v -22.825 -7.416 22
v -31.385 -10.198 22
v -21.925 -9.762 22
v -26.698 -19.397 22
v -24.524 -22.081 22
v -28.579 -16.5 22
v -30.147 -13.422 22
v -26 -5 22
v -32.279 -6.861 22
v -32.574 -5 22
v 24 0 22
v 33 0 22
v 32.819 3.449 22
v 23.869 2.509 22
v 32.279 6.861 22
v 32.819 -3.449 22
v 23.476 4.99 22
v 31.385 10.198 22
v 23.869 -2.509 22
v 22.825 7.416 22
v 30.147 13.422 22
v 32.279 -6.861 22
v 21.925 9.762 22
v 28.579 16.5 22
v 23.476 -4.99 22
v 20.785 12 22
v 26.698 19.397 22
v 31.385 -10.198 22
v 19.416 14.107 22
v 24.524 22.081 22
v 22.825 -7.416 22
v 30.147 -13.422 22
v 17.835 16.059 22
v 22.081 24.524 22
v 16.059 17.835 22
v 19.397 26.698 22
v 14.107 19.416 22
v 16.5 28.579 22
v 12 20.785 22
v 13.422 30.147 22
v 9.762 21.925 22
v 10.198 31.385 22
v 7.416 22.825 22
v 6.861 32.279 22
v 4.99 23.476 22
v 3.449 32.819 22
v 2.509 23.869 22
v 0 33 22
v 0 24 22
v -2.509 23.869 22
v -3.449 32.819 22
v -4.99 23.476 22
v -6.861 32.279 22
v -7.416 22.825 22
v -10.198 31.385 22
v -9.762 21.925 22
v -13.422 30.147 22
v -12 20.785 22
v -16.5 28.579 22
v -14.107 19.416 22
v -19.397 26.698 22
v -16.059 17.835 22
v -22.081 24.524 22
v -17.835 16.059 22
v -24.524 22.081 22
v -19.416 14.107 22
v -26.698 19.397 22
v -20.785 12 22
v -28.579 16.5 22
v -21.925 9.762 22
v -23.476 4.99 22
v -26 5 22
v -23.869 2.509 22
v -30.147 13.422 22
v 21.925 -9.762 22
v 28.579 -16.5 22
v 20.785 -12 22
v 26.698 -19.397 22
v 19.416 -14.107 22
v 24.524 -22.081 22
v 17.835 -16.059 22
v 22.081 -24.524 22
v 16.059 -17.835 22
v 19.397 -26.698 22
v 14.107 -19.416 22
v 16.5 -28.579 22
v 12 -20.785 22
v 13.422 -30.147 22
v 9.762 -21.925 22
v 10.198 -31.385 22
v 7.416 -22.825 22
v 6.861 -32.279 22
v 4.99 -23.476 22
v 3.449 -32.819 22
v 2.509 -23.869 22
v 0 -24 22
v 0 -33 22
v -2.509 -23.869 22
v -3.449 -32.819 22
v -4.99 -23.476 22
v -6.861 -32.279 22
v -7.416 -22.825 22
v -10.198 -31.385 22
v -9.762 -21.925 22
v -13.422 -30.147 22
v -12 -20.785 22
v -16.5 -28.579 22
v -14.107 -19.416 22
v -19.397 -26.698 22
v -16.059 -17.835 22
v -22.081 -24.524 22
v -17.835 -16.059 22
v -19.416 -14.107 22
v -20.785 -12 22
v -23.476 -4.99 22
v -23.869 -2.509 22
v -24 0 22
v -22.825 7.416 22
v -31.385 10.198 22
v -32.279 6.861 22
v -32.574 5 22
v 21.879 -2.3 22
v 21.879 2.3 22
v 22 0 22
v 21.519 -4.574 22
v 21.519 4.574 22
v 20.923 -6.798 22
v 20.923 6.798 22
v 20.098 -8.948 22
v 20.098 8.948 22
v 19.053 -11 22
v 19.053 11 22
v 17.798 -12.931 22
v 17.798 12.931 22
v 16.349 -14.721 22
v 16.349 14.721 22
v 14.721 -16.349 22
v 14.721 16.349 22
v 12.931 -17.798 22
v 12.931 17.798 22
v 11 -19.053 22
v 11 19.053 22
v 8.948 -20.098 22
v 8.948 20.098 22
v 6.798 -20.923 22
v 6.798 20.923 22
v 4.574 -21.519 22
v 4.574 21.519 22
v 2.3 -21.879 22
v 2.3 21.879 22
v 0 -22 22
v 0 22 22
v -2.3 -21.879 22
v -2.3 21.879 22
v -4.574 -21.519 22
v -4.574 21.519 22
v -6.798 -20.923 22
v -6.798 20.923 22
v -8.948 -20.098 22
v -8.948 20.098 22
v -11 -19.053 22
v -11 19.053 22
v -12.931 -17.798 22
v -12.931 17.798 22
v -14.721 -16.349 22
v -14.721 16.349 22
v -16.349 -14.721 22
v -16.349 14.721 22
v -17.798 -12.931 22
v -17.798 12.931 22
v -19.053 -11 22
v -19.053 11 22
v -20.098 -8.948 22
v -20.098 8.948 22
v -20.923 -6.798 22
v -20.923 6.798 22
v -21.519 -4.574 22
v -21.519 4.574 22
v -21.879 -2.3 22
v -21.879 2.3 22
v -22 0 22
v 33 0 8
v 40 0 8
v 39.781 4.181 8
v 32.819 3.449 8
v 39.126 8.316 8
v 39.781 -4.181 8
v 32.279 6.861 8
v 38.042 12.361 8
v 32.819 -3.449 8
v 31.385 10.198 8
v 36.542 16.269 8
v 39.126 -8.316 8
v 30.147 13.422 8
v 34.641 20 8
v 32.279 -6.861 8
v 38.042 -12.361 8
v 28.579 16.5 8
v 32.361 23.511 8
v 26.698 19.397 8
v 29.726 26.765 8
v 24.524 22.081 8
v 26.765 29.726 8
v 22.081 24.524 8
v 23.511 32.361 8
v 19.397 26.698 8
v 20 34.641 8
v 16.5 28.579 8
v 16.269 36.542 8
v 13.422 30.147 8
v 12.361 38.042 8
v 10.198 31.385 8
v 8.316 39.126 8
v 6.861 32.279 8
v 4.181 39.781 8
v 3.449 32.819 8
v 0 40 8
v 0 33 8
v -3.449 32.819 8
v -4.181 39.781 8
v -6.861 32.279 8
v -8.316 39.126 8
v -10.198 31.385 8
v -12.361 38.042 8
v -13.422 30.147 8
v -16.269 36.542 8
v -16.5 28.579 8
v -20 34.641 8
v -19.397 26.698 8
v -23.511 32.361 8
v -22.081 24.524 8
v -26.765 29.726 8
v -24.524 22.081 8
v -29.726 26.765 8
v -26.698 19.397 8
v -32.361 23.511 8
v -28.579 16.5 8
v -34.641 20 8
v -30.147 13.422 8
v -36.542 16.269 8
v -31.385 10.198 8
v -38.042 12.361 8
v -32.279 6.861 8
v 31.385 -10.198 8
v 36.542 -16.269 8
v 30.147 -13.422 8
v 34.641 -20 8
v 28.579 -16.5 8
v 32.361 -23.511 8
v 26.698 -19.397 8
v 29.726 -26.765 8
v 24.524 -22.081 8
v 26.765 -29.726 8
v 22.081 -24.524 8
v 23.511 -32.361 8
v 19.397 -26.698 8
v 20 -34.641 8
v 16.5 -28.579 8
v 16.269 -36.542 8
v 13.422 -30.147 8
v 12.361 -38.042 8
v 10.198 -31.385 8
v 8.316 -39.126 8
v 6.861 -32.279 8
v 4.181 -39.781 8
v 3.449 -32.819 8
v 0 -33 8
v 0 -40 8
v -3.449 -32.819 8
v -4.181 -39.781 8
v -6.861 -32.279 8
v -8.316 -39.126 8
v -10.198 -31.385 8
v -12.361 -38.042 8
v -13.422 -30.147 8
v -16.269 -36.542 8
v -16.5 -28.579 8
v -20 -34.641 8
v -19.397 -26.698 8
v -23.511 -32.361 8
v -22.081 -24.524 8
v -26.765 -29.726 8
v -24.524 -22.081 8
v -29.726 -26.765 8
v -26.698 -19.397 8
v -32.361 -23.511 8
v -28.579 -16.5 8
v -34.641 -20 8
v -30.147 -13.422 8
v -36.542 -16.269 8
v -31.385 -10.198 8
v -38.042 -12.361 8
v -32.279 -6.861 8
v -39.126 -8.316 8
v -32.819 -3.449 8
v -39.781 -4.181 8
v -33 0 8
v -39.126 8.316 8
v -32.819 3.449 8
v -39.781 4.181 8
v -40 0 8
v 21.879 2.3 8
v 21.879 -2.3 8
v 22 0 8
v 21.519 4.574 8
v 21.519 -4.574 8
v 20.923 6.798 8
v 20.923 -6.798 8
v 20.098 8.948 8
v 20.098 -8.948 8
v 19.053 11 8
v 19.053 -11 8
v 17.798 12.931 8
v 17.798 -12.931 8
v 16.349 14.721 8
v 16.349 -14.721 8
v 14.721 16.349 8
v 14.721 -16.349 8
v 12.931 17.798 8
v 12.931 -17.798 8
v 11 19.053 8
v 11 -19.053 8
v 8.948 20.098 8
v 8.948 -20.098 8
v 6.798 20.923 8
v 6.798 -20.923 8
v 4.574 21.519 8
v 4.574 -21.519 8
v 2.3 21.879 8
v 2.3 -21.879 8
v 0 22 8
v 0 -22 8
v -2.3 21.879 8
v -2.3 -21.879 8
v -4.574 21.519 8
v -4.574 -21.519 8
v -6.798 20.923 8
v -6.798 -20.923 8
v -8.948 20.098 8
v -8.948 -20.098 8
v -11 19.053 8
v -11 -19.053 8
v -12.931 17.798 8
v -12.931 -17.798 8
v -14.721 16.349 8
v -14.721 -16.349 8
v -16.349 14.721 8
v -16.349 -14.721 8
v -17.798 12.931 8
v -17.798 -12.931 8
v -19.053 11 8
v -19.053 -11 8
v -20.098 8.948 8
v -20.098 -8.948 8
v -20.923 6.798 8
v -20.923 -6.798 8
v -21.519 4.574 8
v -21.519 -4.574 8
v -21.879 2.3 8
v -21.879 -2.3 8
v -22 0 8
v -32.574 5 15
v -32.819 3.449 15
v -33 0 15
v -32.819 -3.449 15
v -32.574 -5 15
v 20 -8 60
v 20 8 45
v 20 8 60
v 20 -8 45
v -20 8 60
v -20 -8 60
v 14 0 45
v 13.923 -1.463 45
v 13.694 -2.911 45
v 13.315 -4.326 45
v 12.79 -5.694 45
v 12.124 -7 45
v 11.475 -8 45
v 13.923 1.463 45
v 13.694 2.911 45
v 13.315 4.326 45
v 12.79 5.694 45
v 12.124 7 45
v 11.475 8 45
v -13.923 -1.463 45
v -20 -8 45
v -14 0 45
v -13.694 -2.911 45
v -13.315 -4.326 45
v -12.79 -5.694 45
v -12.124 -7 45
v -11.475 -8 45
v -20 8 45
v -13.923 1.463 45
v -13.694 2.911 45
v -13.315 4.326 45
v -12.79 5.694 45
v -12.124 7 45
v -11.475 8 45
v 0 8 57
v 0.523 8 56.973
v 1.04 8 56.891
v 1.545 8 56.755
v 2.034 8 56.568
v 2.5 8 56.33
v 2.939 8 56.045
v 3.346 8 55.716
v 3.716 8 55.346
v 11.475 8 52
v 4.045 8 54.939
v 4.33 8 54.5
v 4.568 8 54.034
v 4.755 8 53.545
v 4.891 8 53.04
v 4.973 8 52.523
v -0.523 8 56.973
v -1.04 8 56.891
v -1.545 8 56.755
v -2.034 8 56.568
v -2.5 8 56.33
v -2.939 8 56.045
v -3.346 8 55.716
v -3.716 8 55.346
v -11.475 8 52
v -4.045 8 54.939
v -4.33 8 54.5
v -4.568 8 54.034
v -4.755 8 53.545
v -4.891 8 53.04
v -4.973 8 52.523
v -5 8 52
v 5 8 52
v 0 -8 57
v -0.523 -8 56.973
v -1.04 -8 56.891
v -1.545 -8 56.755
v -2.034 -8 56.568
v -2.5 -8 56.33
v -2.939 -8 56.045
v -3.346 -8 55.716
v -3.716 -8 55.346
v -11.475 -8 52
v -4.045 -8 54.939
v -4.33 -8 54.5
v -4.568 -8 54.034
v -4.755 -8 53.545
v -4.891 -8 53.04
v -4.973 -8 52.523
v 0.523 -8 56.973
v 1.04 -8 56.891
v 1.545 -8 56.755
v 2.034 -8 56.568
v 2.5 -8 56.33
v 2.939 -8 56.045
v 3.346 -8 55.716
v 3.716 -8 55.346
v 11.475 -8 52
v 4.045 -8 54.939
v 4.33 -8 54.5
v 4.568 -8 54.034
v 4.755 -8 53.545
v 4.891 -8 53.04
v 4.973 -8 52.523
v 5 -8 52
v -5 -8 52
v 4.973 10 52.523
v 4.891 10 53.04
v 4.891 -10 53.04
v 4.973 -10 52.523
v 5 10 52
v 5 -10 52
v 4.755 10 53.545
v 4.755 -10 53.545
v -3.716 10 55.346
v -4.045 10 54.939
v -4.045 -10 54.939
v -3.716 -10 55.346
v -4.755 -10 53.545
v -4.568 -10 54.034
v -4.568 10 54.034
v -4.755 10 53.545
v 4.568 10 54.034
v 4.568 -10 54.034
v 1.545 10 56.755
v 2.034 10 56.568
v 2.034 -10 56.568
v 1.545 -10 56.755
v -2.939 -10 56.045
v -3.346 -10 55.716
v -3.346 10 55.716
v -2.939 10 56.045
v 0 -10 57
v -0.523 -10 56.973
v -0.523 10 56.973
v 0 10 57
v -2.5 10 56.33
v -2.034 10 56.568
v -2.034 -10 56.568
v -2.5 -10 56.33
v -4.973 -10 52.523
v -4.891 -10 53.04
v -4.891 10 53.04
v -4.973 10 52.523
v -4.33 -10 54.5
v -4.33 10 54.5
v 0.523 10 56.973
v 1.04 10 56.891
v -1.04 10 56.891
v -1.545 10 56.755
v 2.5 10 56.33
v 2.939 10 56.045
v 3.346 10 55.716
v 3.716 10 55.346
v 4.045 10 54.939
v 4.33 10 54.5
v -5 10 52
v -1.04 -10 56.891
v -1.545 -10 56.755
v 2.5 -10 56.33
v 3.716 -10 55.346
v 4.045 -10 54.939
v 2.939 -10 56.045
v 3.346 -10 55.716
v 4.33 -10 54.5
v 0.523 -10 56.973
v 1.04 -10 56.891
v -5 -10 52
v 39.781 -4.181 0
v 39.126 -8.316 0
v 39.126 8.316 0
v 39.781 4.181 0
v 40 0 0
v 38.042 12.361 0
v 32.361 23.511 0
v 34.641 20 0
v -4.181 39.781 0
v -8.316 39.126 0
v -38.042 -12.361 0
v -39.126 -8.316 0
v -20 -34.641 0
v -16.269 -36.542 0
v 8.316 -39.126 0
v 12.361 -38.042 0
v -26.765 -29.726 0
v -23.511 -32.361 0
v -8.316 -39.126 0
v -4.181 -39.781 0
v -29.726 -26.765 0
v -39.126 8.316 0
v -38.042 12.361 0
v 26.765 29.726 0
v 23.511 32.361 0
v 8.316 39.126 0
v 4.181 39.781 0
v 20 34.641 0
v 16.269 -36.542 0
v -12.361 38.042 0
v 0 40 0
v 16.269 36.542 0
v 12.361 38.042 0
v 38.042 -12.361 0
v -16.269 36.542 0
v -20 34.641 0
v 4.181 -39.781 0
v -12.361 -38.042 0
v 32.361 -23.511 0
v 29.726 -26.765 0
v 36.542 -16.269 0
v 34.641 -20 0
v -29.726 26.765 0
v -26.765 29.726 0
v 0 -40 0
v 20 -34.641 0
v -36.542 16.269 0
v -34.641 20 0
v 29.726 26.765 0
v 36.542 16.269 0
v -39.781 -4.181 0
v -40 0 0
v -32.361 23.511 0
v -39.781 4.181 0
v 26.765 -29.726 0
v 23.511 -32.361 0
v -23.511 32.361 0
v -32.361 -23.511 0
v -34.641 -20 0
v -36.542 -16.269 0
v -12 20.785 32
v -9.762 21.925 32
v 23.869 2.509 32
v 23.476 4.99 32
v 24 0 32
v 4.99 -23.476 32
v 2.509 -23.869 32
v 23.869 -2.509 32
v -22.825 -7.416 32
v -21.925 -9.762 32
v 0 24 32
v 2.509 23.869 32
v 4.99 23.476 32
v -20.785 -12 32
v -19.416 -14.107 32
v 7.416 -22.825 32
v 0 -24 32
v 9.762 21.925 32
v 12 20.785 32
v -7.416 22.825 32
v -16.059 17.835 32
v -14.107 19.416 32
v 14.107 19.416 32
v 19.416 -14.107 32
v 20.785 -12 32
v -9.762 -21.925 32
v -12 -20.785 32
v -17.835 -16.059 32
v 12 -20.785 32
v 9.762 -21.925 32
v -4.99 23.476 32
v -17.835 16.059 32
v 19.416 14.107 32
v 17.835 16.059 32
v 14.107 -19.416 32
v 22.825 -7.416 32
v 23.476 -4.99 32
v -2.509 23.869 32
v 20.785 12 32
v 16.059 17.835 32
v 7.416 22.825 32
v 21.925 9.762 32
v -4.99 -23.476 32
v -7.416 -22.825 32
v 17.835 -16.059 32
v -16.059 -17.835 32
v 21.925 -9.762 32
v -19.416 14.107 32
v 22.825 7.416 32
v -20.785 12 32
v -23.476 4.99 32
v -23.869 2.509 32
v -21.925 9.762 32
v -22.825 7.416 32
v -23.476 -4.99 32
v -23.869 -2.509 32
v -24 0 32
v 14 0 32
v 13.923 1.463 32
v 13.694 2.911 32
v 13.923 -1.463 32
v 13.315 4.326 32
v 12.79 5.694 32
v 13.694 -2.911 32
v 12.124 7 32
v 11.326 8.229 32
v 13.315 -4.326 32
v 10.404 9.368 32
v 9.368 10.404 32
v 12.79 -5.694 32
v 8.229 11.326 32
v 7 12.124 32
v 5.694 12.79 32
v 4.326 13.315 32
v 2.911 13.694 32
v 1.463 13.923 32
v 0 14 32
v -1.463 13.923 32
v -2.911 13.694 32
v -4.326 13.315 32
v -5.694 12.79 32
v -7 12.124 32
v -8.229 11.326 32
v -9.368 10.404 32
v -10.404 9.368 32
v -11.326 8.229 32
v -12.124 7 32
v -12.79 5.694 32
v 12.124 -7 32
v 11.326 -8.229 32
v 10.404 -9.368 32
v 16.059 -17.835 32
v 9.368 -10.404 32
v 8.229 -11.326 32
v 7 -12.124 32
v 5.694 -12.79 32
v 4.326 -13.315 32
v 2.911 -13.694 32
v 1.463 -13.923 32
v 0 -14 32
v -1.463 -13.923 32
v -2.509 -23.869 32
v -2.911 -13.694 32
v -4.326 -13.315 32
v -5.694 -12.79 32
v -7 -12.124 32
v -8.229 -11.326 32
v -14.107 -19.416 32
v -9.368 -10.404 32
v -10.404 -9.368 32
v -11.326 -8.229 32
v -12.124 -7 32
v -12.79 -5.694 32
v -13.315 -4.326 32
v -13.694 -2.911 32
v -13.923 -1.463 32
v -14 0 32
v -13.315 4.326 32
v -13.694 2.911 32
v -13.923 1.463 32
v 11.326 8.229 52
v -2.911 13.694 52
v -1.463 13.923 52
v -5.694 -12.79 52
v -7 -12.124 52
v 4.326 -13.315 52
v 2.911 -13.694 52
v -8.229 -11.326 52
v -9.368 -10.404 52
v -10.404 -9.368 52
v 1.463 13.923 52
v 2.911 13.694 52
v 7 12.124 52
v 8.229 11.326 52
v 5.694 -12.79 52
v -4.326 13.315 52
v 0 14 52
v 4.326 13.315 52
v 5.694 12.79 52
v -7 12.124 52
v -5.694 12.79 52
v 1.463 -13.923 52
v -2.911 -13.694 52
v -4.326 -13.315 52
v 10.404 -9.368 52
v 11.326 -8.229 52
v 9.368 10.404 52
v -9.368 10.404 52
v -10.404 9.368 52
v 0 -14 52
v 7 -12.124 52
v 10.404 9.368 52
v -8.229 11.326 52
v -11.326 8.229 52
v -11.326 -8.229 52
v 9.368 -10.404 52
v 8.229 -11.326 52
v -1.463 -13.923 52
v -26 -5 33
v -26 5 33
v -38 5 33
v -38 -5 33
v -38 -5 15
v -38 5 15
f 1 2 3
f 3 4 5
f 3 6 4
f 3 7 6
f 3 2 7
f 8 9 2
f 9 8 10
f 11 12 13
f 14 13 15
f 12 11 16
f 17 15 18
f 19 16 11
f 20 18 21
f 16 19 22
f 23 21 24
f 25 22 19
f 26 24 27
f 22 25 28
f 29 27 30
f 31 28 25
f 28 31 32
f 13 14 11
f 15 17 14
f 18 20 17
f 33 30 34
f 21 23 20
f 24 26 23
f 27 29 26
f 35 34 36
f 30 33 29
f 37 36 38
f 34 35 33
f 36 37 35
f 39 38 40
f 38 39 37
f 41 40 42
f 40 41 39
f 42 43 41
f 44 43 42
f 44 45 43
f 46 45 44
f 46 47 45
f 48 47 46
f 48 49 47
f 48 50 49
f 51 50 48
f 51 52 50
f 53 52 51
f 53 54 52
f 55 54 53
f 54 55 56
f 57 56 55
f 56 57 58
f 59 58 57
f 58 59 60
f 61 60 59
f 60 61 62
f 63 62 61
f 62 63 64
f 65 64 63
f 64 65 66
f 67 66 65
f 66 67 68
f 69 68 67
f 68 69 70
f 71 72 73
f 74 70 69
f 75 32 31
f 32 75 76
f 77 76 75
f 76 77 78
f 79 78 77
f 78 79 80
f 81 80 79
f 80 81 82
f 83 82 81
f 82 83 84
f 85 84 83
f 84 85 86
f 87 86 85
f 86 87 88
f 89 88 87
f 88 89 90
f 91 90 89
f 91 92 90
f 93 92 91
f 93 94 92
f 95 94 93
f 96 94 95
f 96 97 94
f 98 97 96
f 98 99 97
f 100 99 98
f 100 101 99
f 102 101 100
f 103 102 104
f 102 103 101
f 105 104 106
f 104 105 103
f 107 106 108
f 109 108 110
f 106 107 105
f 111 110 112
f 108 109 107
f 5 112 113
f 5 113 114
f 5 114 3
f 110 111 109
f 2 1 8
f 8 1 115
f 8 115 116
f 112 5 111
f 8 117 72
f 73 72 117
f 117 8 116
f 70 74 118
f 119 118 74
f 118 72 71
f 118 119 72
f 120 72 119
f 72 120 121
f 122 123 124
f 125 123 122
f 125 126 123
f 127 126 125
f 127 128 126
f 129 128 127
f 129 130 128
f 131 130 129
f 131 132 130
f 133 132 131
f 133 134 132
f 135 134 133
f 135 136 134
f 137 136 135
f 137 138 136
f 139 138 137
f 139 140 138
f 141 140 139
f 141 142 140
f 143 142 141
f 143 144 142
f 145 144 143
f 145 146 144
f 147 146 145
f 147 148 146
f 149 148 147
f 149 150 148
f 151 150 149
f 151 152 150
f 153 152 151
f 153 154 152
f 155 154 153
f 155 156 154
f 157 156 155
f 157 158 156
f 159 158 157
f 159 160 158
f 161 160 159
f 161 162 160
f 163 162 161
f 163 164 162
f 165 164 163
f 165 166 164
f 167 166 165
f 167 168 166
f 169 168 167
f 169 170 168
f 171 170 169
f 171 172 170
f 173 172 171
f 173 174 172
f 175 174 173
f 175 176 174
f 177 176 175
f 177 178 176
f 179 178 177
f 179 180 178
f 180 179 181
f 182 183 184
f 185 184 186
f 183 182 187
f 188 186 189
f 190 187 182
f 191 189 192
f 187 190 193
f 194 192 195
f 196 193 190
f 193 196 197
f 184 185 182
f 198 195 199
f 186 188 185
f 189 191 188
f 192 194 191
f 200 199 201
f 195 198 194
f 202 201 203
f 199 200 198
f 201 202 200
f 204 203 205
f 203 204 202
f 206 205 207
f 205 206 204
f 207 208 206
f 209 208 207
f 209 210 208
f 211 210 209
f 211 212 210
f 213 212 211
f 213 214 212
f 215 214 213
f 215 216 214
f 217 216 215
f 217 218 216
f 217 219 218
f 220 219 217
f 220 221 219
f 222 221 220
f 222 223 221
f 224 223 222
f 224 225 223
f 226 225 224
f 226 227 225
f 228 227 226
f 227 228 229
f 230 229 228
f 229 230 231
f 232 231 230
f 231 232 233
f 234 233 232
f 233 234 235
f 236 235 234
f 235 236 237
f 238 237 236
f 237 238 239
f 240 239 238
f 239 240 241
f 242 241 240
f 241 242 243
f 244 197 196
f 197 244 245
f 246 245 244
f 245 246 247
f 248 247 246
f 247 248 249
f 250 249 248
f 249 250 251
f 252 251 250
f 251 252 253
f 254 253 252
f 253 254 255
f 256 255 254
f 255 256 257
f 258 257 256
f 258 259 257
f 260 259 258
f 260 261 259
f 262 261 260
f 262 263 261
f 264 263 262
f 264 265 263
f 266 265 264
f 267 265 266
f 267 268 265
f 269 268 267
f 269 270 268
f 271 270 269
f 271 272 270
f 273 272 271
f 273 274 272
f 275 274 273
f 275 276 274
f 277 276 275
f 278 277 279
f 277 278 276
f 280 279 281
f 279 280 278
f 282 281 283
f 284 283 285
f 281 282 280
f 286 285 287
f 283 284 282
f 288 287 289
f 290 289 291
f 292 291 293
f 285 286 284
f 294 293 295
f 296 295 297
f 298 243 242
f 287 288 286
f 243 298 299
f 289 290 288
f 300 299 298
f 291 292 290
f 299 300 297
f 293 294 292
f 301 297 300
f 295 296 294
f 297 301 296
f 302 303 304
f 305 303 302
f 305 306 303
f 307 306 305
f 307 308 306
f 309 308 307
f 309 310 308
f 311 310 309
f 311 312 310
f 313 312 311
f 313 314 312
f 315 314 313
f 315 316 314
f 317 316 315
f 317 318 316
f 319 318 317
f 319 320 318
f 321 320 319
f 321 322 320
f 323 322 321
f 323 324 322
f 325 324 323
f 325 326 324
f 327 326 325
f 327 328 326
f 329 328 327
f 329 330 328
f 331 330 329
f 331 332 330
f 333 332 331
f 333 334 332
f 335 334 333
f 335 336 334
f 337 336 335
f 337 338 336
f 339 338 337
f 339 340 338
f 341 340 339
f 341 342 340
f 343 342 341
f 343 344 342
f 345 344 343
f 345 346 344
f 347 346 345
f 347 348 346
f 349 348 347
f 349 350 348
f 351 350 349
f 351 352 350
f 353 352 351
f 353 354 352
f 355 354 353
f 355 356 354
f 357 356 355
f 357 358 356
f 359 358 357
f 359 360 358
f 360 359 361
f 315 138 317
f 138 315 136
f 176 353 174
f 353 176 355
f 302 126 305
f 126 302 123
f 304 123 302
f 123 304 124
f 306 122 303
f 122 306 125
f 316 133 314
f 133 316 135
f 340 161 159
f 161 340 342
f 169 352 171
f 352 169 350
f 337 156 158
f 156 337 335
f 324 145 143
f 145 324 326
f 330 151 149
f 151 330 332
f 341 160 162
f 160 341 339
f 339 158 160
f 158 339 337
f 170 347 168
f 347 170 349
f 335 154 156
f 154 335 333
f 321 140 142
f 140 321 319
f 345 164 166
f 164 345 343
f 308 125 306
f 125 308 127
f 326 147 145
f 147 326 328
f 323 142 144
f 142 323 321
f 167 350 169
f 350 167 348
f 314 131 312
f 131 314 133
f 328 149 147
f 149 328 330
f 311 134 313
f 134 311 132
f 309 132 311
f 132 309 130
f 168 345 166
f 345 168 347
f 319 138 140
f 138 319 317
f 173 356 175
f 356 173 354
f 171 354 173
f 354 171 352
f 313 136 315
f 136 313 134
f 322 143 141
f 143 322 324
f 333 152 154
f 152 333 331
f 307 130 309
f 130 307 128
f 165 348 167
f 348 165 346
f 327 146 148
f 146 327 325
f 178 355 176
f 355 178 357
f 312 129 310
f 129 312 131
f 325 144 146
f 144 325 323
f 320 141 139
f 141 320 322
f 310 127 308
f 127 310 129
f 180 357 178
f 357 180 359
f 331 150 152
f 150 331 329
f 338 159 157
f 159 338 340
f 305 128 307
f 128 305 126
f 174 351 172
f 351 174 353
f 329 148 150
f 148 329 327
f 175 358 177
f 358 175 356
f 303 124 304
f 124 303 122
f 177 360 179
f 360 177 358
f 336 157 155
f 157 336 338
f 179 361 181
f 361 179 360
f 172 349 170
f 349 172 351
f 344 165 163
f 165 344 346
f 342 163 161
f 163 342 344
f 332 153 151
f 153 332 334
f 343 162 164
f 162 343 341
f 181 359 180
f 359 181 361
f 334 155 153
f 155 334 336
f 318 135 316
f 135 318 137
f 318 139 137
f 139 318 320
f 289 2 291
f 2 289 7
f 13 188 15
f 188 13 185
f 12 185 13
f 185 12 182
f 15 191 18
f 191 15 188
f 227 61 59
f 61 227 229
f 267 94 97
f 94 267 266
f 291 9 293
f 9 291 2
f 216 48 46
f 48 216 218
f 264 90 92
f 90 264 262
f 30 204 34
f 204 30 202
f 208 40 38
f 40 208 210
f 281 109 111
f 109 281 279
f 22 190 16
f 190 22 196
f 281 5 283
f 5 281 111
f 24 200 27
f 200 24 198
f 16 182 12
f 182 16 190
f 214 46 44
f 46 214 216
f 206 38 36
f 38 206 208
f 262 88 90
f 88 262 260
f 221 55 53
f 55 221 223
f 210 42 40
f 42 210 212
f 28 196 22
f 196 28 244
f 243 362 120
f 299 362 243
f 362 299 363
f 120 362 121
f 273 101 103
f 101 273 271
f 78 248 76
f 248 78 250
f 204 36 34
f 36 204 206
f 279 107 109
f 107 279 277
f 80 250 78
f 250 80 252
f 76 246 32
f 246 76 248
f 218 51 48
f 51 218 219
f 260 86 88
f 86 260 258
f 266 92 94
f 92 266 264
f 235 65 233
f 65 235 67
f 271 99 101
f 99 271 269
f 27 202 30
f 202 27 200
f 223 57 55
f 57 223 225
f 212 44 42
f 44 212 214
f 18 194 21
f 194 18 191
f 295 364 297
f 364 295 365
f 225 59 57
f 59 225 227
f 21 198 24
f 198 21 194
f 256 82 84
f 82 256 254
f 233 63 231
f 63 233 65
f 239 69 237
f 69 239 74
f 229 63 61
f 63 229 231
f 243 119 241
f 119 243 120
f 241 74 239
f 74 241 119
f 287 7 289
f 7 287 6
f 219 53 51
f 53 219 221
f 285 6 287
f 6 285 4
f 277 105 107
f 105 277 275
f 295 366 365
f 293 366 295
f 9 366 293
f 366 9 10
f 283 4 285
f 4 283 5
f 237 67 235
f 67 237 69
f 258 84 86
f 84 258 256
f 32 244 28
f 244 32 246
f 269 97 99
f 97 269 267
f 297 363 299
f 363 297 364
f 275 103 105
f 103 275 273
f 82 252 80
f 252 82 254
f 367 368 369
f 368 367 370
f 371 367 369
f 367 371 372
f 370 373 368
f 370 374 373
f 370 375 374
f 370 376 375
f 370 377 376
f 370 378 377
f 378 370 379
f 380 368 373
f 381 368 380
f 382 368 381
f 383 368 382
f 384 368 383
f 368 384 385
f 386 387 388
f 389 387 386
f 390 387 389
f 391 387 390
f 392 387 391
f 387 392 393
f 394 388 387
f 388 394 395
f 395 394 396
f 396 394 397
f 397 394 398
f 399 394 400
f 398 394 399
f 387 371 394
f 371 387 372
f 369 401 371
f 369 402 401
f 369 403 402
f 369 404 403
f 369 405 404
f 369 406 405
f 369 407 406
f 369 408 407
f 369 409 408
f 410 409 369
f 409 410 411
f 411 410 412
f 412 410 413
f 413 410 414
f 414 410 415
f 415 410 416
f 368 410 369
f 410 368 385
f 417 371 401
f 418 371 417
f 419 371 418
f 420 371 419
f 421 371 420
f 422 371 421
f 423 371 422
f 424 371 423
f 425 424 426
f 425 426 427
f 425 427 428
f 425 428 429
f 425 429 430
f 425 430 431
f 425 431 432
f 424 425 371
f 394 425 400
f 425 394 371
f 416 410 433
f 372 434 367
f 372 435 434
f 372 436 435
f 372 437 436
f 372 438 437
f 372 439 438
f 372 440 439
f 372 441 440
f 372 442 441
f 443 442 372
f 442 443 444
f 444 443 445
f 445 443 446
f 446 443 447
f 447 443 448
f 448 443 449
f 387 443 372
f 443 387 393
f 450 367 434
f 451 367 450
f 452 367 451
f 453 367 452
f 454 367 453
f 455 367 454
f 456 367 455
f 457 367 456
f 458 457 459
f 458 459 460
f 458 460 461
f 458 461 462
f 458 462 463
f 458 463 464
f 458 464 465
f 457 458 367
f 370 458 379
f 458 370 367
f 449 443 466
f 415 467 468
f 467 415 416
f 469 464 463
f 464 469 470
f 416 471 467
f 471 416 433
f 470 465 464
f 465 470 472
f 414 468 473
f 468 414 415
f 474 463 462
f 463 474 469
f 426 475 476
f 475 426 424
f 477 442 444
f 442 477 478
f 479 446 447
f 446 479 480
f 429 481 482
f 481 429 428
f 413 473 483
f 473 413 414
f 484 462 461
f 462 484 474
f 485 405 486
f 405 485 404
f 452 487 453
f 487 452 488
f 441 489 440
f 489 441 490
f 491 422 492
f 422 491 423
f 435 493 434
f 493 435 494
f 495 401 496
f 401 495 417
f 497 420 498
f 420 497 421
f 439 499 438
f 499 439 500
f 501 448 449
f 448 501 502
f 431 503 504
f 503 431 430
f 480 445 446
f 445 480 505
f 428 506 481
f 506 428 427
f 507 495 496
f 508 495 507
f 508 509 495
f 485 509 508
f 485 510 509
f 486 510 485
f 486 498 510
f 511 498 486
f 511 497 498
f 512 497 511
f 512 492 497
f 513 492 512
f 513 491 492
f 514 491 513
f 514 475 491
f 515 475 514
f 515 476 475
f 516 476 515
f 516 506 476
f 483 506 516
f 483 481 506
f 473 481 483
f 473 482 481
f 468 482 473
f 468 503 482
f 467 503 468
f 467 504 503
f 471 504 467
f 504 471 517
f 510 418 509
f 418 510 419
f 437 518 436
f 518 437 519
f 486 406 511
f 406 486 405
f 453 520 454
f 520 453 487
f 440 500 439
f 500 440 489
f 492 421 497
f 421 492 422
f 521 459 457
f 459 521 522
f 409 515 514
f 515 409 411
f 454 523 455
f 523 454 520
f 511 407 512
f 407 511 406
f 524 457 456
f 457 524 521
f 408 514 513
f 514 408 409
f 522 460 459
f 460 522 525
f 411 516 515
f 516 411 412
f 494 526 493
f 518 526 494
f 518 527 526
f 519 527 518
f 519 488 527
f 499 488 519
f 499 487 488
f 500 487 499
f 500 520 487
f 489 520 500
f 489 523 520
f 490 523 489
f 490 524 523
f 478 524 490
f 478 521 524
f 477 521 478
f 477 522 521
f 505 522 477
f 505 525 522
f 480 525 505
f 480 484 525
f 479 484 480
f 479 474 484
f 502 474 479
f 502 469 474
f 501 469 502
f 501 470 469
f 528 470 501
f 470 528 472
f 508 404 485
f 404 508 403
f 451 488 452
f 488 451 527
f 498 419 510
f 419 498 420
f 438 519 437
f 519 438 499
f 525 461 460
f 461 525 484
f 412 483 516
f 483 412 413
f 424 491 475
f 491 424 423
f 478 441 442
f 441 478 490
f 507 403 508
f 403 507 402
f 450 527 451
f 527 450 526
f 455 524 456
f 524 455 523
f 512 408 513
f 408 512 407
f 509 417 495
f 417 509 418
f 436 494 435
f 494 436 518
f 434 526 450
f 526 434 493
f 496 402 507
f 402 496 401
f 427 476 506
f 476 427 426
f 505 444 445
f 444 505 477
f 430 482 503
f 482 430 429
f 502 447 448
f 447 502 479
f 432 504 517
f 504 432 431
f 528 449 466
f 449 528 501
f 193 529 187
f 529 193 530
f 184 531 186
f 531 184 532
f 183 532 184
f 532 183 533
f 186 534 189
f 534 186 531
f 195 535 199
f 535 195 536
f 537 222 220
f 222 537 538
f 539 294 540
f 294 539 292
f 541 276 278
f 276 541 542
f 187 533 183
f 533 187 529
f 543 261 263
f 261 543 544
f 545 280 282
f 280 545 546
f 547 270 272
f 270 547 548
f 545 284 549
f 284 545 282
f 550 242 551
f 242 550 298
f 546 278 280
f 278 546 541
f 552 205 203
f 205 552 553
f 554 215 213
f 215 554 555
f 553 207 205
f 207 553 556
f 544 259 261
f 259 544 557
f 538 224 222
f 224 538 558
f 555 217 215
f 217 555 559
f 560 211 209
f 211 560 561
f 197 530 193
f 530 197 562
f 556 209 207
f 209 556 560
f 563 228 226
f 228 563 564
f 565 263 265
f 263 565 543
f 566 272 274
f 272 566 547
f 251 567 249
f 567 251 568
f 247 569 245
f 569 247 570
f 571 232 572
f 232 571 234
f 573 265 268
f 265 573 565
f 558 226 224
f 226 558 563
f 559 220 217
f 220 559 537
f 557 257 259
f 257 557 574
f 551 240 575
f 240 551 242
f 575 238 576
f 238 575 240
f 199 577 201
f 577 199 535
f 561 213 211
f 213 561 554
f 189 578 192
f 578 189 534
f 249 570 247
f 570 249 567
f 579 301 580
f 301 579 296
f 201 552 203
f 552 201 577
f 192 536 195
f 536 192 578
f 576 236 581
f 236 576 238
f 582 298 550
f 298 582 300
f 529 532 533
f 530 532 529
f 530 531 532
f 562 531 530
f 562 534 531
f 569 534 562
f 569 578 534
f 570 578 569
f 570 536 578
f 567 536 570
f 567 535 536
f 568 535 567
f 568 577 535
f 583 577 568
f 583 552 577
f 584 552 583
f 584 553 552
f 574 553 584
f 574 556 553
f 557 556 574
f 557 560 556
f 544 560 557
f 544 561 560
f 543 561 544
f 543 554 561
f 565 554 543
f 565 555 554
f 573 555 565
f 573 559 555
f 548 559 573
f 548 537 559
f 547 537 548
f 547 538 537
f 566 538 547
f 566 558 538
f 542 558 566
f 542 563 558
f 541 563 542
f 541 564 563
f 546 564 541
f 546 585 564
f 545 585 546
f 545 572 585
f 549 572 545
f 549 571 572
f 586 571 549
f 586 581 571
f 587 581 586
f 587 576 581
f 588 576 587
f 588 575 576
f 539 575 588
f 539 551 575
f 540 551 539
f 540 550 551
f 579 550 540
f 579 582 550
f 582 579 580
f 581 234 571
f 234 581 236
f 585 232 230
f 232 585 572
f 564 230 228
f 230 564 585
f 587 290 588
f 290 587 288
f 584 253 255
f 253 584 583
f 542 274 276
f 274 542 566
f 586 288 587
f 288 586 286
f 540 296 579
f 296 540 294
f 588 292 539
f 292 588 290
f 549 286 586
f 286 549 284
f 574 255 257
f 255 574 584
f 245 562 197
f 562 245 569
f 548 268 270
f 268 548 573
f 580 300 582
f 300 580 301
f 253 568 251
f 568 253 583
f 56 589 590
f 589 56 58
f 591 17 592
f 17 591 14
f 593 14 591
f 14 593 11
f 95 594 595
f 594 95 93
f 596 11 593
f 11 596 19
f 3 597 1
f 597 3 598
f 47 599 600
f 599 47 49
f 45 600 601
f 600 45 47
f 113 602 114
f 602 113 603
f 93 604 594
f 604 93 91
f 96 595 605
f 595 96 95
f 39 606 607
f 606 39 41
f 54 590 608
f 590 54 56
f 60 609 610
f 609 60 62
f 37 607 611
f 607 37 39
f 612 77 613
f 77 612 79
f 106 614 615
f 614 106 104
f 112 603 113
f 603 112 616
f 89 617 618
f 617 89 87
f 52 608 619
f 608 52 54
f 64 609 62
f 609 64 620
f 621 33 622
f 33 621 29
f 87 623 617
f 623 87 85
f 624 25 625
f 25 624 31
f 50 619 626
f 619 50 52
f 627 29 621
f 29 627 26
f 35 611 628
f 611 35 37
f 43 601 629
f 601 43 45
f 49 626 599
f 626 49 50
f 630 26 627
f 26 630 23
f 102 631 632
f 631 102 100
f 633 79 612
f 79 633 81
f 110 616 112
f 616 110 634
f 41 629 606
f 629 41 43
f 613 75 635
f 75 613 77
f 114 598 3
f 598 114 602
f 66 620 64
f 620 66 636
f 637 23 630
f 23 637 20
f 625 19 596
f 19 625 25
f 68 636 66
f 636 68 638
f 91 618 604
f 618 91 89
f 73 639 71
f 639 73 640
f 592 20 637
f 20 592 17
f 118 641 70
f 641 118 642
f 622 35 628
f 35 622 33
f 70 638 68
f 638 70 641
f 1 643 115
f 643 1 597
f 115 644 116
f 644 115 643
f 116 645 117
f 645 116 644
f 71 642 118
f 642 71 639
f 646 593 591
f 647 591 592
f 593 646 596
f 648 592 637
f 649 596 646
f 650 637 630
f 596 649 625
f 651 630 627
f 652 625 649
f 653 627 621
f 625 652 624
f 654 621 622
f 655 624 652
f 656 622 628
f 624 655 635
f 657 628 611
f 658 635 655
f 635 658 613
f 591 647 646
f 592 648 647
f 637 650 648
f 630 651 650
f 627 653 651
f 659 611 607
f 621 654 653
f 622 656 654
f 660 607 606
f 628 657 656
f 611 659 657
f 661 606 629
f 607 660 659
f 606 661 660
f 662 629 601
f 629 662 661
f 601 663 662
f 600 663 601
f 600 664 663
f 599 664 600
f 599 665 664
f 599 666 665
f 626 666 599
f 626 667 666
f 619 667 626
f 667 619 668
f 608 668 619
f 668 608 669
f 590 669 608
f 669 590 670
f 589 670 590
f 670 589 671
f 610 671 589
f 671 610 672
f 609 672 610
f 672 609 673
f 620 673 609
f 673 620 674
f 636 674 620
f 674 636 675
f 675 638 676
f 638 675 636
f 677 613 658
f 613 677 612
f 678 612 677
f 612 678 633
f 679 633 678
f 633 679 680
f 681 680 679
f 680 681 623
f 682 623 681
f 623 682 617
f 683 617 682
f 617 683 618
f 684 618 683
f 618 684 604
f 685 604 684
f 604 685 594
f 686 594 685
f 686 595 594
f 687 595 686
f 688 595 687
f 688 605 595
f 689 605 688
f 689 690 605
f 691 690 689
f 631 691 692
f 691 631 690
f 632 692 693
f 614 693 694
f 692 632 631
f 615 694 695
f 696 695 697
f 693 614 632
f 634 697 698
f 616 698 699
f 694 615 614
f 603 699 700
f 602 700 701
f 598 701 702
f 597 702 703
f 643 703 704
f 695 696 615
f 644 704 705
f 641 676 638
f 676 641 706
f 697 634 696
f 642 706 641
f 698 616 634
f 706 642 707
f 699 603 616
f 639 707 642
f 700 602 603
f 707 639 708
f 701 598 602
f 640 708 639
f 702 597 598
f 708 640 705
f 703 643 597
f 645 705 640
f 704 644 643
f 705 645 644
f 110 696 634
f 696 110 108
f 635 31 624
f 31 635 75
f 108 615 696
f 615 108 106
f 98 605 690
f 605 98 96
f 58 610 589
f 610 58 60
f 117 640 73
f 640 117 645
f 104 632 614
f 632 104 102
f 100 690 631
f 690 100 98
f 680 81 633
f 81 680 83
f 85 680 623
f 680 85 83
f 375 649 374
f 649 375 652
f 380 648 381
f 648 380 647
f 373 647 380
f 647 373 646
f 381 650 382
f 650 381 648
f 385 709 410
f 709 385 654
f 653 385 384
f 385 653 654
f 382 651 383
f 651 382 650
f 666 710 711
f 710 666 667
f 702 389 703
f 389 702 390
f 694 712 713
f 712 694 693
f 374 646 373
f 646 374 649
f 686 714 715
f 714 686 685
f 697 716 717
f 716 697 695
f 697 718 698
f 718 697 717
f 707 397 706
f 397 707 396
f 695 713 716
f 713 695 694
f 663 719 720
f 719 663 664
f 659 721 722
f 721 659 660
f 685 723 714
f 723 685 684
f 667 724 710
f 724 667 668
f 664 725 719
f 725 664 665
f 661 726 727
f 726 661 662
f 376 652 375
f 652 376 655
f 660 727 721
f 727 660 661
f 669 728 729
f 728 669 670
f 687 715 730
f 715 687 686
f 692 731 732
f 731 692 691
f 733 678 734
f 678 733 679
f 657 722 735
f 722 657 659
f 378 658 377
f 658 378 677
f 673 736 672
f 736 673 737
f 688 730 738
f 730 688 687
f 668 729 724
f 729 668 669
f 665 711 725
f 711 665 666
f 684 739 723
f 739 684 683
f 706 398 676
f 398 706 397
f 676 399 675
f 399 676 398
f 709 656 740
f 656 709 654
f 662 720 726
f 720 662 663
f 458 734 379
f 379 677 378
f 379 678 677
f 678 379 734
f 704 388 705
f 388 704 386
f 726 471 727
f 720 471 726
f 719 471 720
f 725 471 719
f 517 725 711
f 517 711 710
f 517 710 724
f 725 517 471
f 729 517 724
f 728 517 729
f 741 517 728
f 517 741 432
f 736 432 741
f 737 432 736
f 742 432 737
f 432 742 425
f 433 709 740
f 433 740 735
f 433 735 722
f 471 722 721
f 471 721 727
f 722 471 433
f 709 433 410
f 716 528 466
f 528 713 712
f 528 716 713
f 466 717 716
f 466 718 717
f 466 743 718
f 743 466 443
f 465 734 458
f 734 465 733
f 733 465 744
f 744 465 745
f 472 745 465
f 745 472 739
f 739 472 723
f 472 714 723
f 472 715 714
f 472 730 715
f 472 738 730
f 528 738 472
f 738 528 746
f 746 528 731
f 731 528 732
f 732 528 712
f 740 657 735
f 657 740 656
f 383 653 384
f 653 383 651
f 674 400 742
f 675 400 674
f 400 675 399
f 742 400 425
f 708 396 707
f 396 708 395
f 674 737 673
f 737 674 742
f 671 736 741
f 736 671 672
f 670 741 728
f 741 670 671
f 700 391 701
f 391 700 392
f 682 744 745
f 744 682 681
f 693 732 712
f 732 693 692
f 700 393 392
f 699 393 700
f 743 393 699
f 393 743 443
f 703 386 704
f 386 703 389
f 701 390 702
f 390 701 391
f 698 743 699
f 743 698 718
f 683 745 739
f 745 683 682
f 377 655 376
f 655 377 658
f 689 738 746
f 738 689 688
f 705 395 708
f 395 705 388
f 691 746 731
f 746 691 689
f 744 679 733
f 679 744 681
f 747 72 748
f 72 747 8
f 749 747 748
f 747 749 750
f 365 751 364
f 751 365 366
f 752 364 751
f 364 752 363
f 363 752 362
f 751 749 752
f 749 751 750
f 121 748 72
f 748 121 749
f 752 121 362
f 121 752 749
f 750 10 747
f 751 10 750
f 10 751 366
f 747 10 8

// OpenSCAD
// file: _common.scad
// mechanism 共用設定 + 齒輪 module
$fn = 60;

// 簡化齒輪：N 個齒、節圓半徑 r、齒高 h、齒寬 w
module simple_gear(N = 16, r = 20, h = 4, thick = 6) {
  union() {
    // 主圓盤
    cylinder(h = thick, r = r, center = true);
    // 齒（梯形）
    for (i = [0:N-1]) {
      rotate([0, 0, i * 360 / N])
        translate([r, 0, 0])
          linear_extrude(height = thick, center = true)
            polygon([[0, -2.4], [h, -1.4], [h, 1.4], [0, 2.4]]);
    }
    // 中心凸軸
    cylinder(h = thick * 1.4, r = r * 0.18, center = true);
  }
}
// main file
// 軸1：基座旋轉底座
include <_common.scad>

// 底板
color([0.35, 0.35, 0.38])
  cylinder(h = 8, r = 40);

// 旋轉環（中間環）
color([0.50, 0.50, 0.53])
  translate([0, 0, 8])
  difference() {
    cylinder(h = 14, r = 32);
    translate([0, 0, -1]) cylinder(h = 16, r = 22);
  }

// 上部旋轉台
color([0.40, 0.40, 0.43])
  translate([0, 0, 22]) cylinder(h = 10, r = 24);

// 旋轉軸承示意（黃色環）
color([0.85, 0.65, 0.10])
  translate([0, 0, 8])
  difference() {
    cylinder(h = 14, r = 33);
    translate([0, 0, -1]) cylinder(h = 16, r = 31);
  }

// 上臂底座凸台
color([0.45, 0.45, 0.48])
  translate([0, 0, 32]) cylinder(h = 20, r = 14);

// 兩側肩關節耳片
color([0.40, 0.40, 0.43]) {
  translate([-20, -8, 45]) cube([40, 16, 15]);
  // 耳孔
  translate([0, 0, 52]) rotate([90, 0, 0])
    color([0.15, 0.15, 0.15]) cylinder(h = 20, r = 5, center = true);
}

// 針筒固定座（左側）
color([0.30, 0.30, 0.33])
  translate([-38, -5, 15]) cube([12, 10, 18]);
